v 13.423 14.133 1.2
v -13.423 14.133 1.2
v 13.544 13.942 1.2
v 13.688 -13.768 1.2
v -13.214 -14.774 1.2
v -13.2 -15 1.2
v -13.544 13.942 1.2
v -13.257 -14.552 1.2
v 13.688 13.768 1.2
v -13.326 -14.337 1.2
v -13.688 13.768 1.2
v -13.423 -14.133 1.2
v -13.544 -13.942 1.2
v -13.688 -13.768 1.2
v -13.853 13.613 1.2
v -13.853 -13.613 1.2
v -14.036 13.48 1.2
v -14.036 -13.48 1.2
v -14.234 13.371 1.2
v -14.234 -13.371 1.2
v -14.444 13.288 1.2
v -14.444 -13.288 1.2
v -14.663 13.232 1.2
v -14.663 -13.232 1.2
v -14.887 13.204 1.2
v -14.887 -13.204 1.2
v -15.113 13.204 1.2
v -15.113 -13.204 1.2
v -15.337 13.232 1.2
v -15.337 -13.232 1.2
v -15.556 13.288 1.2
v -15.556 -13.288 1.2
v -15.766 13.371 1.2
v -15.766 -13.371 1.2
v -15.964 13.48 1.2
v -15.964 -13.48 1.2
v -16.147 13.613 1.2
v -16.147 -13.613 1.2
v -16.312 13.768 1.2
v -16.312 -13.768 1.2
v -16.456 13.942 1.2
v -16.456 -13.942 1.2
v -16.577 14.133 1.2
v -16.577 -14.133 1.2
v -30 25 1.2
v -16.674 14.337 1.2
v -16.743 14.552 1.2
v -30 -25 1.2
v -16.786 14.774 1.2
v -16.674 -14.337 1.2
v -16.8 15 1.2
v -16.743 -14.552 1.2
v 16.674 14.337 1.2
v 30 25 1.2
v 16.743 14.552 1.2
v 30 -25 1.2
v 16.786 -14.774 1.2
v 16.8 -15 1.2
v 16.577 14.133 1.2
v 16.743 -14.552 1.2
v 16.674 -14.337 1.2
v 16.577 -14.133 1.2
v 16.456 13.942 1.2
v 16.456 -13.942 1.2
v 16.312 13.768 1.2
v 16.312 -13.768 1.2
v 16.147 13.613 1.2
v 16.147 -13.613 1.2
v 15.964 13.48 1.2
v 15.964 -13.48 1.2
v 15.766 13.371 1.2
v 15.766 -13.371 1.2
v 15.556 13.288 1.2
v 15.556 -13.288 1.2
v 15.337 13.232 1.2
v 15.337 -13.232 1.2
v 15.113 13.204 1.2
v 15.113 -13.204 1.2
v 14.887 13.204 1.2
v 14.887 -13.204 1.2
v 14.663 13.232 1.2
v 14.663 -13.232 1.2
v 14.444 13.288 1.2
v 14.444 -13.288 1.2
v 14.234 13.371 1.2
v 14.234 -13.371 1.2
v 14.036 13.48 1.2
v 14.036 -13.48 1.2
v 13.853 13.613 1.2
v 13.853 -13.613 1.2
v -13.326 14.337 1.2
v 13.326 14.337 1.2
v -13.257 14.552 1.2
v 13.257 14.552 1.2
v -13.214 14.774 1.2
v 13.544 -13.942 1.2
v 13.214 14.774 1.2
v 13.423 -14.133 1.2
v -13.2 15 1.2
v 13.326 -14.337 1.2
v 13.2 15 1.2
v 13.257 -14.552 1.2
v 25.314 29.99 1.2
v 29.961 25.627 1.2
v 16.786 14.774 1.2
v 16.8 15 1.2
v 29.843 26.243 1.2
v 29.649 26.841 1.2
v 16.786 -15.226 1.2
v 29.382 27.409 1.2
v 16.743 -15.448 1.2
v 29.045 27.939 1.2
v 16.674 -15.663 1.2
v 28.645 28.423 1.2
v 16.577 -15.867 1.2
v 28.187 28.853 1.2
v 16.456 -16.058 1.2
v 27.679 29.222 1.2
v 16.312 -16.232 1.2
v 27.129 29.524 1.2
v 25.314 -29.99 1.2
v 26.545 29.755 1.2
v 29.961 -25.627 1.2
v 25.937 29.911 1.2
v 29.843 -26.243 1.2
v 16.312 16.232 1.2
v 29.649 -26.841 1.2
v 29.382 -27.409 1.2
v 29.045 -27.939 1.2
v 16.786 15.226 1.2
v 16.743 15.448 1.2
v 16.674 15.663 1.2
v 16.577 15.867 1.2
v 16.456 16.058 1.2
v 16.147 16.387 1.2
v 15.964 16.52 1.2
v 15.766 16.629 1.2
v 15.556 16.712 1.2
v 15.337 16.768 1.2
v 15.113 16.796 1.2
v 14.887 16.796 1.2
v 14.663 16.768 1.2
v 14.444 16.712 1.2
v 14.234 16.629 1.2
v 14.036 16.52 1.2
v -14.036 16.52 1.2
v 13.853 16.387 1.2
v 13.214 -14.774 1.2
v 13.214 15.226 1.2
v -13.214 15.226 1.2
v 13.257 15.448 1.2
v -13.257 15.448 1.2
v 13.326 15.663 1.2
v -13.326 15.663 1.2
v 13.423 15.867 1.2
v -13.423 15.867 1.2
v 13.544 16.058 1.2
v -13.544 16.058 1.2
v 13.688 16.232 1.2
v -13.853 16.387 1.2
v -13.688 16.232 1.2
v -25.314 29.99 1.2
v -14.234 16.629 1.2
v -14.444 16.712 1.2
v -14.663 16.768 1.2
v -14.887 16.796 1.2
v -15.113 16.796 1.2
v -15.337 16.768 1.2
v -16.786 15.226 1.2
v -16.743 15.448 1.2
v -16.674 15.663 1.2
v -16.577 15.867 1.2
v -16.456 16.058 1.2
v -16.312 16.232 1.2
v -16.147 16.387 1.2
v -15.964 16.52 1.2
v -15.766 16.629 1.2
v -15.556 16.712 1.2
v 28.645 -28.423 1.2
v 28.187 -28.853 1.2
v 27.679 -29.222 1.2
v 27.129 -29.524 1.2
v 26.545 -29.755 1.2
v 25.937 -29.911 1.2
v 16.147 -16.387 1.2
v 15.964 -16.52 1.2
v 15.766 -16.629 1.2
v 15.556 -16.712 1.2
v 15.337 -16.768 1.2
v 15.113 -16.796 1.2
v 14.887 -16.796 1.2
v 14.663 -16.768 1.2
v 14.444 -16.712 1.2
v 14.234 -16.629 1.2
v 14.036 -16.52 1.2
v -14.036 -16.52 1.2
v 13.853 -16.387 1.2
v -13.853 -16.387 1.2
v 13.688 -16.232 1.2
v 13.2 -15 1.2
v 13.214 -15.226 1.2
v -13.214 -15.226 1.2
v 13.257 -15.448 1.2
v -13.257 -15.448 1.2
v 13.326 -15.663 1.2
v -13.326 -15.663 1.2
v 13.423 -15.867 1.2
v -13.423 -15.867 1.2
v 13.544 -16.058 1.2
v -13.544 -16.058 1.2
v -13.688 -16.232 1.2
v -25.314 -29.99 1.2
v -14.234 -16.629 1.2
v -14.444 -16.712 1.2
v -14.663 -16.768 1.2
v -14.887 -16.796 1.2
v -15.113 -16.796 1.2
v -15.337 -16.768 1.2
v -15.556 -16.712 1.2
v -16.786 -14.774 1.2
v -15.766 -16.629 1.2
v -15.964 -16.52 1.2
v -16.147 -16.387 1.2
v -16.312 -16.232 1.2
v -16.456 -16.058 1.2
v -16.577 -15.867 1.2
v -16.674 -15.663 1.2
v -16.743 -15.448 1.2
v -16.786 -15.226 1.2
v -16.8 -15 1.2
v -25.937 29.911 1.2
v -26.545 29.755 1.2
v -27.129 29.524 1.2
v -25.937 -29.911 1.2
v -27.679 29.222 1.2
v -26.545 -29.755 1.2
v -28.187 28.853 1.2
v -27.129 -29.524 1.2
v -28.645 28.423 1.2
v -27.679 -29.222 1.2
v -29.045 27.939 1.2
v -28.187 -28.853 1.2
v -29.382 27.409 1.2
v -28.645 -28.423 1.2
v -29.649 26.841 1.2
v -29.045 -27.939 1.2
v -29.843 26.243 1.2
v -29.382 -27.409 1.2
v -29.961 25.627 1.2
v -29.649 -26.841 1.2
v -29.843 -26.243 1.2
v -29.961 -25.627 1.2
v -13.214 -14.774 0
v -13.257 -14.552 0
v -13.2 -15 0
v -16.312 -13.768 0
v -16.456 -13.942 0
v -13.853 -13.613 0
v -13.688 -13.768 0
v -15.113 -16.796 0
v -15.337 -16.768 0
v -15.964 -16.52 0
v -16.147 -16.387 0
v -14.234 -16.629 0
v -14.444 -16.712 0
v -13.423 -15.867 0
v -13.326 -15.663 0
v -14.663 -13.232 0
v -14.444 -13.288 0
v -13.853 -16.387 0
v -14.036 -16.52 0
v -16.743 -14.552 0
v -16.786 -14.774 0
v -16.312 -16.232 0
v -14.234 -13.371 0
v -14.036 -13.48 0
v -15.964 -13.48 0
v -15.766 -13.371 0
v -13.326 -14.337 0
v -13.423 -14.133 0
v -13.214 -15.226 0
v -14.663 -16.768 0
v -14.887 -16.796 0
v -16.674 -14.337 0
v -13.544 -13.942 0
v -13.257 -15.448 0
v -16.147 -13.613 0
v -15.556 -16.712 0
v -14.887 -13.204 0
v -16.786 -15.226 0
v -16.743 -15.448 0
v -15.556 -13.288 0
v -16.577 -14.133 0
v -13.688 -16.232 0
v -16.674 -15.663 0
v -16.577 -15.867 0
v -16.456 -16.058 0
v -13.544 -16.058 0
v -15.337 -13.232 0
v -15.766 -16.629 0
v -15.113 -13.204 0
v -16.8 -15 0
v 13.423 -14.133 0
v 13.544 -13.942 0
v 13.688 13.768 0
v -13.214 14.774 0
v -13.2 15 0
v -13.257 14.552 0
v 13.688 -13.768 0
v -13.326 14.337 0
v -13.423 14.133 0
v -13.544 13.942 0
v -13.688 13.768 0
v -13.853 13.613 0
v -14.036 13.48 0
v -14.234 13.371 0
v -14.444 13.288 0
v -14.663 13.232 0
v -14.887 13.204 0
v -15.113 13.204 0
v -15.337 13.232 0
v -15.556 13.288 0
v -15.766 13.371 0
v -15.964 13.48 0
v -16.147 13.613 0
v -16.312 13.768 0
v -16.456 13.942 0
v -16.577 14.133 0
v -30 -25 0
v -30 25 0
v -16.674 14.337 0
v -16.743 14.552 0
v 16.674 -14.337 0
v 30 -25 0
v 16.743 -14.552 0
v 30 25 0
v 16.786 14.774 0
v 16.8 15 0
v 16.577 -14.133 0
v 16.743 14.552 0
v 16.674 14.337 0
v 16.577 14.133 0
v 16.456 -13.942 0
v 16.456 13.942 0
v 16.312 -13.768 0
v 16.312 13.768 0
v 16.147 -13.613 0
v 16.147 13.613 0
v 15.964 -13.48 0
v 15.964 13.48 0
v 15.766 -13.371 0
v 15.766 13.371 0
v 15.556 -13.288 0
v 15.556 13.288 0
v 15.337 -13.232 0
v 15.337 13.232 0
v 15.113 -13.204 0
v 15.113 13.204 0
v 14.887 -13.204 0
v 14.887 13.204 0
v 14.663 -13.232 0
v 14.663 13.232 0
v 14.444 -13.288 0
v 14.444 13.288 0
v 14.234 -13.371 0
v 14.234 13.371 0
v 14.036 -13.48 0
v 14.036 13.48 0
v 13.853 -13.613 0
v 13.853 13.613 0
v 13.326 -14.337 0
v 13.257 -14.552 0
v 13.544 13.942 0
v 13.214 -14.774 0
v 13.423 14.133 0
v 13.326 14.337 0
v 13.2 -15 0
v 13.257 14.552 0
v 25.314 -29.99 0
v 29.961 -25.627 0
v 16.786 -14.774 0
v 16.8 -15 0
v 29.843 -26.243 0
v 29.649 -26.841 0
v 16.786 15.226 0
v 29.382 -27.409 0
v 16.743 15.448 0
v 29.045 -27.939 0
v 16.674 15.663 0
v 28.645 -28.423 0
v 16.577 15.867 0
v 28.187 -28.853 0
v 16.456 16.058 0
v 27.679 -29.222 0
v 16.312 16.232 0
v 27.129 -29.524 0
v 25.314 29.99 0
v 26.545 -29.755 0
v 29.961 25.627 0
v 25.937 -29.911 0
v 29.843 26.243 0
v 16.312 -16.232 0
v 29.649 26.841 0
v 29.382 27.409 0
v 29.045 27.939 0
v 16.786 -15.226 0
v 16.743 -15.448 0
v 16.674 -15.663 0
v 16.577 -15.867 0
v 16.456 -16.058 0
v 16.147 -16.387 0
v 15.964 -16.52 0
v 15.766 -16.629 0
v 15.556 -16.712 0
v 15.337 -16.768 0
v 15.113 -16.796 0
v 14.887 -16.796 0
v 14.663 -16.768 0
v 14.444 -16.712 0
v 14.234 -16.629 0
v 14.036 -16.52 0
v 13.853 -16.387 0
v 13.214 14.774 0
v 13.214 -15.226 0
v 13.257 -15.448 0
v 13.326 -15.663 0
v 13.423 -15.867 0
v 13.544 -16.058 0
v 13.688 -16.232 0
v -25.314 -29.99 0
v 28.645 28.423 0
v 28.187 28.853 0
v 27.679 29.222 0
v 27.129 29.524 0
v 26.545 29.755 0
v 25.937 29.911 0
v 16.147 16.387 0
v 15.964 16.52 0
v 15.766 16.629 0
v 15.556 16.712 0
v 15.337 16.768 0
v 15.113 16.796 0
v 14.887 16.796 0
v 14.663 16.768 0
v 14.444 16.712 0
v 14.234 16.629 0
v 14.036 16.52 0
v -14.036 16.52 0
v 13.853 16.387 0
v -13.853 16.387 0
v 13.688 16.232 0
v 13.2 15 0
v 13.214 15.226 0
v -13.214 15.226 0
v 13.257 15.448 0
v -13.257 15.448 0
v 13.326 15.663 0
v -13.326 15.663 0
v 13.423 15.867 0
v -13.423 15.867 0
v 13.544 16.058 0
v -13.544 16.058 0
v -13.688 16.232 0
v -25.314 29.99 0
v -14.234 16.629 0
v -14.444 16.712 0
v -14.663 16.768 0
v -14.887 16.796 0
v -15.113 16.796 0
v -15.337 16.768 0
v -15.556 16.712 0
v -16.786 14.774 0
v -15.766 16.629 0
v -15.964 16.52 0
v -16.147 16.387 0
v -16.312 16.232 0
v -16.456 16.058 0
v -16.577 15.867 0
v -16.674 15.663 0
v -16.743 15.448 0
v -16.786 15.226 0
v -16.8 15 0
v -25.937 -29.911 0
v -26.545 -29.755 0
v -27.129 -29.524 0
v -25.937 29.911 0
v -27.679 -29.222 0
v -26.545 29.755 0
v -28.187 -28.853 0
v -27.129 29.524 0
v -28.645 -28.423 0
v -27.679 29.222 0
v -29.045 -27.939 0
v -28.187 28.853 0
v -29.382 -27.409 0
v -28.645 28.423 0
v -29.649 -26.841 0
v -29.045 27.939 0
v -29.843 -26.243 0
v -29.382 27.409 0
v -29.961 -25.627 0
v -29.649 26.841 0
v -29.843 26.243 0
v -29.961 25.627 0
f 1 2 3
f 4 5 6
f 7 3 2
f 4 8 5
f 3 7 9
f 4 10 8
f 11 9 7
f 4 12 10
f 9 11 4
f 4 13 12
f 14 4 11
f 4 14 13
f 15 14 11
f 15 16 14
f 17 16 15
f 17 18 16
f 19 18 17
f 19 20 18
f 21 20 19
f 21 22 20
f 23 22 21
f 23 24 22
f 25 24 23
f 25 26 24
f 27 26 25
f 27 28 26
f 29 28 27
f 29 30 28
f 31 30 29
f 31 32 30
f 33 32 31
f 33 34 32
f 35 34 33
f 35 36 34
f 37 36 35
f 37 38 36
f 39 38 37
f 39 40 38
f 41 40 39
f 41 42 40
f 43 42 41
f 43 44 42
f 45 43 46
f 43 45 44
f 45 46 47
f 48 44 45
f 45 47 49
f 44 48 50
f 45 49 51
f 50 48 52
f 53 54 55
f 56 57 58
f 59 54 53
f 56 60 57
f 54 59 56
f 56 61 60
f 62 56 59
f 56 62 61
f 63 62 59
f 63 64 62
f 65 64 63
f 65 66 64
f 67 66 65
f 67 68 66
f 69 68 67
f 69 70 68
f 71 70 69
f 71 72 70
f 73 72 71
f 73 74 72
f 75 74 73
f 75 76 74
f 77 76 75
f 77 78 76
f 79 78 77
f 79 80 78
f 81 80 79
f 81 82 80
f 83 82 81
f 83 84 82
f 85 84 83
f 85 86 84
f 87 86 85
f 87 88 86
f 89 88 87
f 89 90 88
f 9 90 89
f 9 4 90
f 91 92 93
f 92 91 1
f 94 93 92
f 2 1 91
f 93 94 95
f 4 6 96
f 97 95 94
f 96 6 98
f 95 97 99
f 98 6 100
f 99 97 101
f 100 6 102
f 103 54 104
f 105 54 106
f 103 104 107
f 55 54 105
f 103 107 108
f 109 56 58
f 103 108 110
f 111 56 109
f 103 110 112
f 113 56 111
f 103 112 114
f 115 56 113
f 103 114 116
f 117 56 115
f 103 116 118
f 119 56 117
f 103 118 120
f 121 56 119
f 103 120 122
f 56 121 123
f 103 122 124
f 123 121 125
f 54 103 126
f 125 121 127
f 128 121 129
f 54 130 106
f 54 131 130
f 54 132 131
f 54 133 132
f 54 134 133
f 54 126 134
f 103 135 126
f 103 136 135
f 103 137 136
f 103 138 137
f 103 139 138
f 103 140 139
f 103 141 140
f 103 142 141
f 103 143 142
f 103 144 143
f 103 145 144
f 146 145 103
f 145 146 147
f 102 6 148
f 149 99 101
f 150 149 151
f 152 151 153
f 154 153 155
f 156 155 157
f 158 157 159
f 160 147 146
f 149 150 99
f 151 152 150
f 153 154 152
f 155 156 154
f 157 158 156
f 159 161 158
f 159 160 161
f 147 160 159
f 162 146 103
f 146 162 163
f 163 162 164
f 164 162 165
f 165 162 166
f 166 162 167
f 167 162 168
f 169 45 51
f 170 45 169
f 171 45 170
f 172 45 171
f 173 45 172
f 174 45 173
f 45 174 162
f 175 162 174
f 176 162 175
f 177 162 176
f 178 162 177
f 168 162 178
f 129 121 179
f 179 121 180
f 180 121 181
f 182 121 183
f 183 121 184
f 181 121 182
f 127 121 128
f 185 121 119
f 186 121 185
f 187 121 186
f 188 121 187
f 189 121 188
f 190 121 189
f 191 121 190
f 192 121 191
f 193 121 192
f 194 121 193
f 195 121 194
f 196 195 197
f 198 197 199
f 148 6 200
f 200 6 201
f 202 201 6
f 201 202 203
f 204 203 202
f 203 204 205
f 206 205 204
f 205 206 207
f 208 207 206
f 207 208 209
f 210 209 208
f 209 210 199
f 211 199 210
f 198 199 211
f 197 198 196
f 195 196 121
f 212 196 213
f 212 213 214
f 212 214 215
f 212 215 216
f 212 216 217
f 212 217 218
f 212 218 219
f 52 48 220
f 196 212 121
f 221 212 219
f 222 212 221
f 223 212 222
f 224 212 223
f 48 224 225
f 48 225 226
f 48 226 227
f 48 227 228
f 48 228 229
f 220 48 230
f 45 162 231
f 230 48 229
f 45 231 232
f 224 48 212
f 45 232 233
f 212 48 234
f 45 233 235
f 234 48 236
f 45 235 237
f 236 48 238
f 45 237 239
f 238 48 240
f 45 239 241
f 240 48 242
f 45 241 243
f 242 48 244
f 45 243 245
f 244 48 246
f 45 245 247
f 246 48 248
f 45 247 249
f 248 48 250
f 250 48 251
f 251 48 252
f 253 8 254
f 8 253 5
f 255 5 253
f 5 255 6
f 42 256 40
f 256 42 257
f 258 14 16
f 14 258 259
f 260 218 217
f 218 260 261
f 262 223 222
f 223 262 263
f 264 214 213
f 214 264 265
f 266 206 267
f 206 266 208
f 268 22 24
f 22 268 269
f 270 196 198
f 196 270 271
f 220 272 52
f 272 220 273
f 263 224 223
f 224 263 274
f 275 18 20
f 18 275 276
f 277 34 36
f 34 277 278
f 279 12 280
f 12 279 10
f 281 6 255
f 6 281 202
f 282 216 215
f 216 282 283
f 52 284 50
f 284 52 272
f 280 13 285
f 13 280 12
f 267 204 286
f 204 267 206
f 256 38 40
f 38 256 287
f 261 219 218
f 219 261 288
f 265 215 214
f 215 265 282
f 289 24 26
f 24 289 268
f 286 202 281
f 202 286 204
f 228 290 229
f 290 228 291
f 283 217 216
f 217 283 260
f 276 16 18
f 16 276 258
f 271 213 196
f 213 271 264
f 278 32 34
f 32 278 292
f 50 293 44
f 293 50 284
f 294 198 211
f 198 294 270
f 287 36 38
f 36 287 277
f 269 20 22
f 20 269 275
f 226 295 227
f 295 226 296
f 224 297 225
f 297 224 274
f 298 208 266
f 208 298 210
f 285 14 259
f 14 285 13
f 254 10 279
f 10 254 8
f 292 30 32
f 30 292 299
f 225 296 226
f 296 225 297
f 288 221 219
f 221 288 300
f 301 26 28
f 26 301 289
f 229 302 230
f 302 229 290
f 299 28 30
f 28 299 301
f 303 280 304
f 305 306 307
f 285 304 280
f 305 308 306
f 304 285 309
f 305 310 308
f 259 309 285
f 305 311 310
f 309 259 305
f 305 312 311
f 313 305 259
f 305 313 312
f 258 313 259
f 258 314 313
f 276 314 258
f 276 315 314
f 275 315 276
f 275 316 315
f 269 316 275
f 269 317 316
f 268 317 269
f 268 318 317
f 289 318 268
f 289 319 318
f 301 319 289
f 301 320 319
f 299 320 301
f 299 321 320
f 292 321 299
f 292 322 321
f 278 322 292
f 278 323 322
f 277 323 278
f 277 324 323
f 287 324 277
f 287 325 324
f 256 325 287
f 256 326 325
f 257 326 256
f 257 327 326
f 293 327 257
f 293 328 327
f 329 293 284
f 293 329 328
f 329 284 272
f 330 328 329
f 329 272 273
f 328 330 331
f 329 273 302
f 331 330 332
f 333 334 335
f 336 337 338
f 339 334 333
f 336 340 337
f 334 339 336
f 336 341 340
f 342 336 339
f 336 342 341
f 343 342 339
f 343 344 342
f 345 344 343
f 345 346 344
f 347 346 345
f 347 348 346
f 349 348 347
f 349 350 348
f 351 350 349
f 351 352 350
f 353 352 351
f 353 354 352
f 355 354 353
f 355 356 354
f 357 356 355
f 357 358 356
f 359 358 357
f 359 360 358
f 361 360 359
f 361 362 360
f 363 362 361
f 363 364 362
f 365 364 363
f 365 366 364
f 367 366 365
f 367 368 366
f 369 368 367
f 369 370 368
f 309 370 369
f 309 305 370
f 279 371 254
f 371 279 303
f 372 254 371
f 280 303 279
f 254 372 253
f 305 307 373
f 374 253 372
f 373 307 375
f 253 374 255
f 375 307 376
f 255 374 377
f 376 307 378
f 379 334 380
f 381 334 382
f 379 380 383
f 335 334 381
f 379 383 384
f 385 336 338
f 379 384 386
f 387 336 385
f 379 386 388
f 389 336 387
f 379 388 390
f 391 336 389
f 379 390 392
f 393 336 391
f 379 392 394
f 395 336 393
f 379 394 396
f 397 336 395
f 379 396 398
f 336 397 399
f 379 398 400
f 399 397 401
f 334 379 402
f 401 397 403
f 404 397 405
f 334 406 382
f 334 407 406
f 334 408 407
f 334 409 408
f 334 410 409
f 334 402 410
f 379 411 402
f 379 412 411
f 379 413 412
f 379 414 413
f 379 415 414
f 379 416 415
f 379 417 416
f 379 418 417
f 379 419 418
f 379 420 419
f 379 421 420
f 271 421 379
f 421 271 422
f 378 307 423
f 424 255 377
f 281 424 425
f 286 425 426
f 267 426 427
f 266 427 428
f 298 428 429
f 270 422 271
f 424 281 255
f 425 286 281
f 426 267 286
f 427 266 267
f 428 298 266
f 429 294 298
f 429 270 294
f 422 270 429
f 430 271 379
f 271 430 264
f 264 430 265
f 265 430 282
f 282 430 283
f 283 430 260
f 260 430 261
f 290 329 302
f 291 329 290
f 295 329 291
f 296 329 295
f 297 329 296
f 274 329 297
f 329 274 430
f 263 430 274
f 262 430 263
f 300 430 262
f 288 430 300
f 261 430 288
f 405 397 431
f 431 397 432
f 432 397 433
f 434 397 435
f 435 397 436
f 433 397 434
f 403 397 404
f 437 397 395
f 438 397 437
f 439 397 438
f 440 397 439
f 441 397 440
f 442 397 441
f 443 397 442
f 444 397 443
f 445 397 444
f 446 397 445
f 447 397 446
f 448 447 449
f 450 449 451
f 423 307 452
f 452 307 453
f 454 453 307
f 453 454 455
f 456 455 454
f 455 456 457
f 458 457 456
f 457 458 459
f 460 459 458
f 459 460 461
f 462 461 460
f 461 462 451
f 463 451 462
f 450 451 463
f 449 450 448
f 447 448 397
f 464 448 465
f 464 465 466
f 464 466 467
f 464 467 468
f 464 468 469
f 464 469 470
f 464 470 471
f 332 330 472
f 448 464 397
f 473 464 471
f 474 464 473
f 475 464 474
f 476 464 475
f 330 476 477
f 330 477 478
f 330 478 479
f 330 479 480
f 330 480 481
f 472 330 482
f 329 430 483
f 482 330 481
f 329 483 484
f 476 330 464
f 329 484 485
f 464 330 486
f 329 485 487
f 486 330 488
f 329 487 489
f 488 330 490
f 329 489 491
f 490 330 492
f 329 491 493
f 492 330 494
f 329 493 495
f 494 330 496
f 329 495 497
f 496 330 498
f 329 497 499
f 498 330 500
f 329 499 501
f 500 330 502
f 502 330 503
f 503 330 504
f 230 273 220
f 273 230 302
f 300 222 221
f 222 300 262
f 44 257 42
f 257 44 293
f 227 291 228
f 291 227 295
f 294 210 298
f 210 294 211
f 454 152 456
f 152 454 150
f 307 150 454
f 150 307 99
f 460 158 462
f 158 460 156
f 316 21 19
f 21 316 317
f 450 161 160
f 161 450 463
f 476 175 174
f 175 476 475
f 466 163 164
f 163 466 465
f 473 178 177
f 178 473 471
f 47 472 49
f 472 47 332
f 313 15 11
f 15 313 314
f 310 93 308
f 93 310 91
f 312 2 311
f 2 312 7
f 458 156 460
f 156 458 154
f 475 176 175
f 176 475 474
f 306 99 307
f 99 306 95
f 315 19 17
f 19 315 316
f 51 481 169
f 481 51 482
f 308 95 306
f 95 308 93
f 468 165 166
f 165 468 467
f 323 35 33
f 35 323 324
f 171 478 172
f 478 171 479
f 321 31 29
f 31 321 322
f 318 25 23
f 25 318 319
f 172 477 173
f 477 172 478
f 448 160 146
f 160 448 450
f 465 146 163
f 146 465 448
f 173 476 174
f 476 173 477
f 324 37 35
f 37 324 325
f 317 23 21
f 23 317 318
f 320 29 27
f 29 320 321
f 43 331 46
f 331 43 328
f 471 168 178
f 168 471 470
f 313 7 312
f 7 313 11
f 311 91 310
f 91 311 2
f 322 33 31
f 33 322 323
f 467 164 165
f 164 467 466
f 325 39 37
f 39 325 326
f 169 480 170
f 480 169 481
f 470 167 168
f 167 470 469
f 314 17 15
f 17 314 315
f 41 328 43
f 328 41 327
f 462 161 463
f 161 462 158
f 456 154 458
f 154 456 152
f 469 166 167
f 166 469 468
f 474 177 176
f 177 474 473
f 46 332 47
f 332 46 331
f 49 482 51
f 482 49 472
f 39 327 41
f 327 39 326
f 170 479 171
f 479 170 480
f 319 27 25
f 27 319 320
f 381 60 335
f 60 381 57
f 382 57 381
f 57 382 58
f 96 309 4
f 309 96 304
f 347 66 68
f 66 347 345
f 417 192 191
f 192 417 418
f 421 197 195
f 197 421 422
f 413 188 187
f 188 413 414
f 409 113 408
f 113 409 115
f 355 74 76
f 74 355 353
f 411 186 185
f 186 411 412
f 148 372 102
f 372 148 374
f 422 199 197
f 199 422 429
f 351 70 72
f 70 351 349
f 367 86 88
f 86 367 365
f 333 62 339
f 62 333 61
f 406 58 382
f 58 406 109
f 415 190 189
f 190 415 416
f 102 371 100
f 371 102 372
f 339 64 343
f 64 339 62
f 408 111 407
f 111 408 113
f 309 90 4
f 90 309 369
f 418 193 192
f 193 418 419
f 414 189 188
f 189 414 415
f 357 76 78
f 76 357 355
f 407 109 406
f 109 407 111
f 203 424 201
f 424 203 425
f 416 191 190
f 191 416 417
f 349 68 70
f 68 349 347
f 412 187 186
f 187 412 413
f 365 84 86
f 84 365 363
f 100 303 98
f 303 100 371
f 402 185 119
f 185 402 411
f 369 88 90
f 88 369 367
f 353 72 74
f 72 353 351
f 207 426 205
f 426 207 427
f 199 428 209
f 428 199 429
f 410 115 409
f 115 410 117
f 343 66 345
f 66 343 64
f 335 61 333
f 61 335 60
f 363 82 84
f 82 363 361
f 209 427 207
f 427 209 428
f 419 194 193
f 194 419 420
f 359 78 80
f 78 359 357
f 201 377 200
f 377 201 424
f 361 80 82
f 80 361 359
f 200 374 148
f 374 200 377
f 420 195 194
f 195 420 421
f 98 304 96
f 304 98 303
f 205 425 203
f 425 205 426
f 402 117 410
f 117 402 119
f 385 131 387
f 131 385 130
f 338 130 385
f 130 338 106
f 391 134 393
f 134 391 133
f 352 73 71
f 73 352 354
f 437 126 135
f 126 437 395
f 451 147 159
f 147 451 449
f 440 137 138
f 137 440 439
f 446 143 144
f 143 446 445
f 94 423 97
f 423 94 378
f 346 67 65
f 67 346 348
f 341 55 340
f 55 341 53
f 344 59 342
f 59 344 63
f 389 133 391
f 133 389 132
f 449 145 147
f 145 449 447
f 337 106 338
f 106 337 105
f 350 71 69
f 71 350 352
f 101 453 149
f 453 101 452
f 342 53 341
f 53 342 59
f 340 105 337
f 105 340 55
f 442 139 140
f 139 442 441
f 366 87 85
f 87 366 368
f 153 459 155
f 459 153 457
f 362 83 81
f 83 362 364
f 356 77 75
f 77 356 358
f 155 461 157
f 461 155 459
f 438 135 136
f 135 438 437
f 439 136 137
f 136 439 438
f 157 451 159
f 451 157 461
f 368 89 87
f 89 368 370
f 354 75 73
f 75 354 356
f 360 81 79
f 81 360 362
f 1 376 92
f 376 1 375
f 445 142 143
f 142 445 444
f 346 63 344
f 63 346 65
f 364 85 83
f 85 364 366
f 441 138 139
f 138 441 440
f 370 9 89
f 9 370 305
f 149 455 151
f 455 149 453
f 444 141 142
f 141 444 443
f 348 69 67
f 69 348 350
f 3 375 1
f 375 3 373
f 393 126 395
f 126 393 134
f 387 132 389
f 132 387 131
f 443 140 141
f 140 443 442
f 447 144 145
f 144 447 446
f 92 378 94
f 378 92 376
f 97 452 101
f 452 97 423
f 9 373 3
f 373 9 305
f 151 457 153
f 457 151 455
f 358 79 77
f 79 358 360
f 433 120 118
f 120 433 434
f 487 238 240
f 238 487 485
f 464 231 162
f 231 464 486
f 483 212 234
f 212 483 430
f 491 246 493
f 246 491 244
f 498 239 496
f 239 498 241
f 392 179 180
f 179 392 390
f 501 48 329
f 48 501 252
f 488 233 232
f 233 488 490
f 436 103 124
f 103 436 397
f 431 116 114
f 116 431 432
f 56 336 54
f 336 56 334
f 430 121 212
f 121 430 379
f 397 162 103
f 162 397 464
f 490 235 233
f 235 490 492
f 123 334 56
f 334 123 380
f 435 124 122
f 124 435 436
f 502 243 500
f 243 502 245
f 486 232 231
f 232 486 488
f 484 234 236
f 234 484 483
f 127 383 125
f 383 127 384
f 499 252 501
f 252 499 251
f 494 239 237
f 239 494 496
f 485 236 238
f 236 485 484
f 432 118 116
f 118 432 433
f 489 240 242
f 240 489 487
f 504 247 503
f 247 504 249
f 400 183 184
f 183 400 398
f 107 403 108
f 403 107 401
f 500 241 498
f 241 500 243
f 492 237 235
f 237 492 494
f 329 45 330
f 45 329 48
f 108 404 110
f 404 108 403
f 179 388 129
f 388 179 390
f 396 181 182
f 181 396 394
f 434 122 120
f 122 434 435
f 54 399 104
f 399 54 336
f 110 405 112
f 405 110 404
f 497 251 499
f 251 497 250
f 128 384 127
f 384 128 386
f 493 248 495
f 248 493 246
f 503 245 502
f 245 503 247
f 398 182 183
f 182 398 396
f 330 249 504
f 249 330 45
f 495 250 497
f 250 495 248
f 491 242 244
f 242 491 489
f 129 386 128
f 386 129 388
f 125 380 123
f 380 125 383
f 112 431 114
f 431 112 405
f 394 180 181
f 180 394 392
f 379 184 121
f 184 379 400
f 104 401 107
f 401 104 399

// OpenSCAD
$fn = 50;


difference() {
	union() {
		hull() {
			translate(v = [-25.0000000000, 25.0000000000, 0]) {
				cylinder(h = 12, r = 5);
			}
			translate(v = [25.0000000000, 25.0000000000, 0]) {
				cylinder(h = 12, r = 5);
			}
			translate(v = [-25.0000000000, -25.0000000000, 0]) {
				cylinder(h = 12, r = 5);
			}
			translate(v = [25.0000000000, -25.0000000000, 0]) {
				cylinder(h = 12, r = 5);
			}
		}
	}
	union() {
		translate(v = [0, 0, 1.2000000000]) {
			hull() {
				translate(v = [-25.0000000000, 25.0000000000, 0]) {
					cylinder(h = 10.8000000000, r = 3.8000000000);
				}
				translate(v = [25.0000000000, 25.0000000000, 0]) {
					cylinder(h = 10.8000000000, r = 3.8000000000);
				}
				translate(v = [-25.0000000000, -25.0000000000, 0]) {
					cylinder(h = 10.8000000000, r = 3.8000000000);
				}
				translate(v = [25.0000000000, -25.0000000000, 0]) {
					cylinder(h = 10.8000000000, r = 3.8000000000);
				}
			}
		}
		#translate(v = [-15.0000000000, -15.0000000000, 0]) {
			cylinder(h = 1.2000000000, r = 1.8000000000);
		}
		#translate(v = [-15.0000000000, 15.0000000000, 0]) {
			cylinder(h = 1.2000000000, r = 1.8000000000);
		}
		#translate(v = [15.0000000000, -15.0000000000, 0]) {
			cylinder(h = 1.2000000000, r = 1.8000000000);
		}
		#translate(v = [15.0000000000, 15.0000000000, 0]) {
			cylinder(h = 1.2000000000, r = 1.8000000000);
		}
		translate(v = [-250.0000000000, -250.0000000000, 1.2000000000]) {
			cube(size = [500, 500, 500]);
		}
		translate(v = [-250.0000000000, -250.0000000000, 1.2000000000]) {
			cube(size = [500, 500, 500]);
		}
		translate(v = [-250.0000000000, -250.0000000000, 1.2000000000]) {
			cube(size = [500, 500, 500]);
		}
	}
}
